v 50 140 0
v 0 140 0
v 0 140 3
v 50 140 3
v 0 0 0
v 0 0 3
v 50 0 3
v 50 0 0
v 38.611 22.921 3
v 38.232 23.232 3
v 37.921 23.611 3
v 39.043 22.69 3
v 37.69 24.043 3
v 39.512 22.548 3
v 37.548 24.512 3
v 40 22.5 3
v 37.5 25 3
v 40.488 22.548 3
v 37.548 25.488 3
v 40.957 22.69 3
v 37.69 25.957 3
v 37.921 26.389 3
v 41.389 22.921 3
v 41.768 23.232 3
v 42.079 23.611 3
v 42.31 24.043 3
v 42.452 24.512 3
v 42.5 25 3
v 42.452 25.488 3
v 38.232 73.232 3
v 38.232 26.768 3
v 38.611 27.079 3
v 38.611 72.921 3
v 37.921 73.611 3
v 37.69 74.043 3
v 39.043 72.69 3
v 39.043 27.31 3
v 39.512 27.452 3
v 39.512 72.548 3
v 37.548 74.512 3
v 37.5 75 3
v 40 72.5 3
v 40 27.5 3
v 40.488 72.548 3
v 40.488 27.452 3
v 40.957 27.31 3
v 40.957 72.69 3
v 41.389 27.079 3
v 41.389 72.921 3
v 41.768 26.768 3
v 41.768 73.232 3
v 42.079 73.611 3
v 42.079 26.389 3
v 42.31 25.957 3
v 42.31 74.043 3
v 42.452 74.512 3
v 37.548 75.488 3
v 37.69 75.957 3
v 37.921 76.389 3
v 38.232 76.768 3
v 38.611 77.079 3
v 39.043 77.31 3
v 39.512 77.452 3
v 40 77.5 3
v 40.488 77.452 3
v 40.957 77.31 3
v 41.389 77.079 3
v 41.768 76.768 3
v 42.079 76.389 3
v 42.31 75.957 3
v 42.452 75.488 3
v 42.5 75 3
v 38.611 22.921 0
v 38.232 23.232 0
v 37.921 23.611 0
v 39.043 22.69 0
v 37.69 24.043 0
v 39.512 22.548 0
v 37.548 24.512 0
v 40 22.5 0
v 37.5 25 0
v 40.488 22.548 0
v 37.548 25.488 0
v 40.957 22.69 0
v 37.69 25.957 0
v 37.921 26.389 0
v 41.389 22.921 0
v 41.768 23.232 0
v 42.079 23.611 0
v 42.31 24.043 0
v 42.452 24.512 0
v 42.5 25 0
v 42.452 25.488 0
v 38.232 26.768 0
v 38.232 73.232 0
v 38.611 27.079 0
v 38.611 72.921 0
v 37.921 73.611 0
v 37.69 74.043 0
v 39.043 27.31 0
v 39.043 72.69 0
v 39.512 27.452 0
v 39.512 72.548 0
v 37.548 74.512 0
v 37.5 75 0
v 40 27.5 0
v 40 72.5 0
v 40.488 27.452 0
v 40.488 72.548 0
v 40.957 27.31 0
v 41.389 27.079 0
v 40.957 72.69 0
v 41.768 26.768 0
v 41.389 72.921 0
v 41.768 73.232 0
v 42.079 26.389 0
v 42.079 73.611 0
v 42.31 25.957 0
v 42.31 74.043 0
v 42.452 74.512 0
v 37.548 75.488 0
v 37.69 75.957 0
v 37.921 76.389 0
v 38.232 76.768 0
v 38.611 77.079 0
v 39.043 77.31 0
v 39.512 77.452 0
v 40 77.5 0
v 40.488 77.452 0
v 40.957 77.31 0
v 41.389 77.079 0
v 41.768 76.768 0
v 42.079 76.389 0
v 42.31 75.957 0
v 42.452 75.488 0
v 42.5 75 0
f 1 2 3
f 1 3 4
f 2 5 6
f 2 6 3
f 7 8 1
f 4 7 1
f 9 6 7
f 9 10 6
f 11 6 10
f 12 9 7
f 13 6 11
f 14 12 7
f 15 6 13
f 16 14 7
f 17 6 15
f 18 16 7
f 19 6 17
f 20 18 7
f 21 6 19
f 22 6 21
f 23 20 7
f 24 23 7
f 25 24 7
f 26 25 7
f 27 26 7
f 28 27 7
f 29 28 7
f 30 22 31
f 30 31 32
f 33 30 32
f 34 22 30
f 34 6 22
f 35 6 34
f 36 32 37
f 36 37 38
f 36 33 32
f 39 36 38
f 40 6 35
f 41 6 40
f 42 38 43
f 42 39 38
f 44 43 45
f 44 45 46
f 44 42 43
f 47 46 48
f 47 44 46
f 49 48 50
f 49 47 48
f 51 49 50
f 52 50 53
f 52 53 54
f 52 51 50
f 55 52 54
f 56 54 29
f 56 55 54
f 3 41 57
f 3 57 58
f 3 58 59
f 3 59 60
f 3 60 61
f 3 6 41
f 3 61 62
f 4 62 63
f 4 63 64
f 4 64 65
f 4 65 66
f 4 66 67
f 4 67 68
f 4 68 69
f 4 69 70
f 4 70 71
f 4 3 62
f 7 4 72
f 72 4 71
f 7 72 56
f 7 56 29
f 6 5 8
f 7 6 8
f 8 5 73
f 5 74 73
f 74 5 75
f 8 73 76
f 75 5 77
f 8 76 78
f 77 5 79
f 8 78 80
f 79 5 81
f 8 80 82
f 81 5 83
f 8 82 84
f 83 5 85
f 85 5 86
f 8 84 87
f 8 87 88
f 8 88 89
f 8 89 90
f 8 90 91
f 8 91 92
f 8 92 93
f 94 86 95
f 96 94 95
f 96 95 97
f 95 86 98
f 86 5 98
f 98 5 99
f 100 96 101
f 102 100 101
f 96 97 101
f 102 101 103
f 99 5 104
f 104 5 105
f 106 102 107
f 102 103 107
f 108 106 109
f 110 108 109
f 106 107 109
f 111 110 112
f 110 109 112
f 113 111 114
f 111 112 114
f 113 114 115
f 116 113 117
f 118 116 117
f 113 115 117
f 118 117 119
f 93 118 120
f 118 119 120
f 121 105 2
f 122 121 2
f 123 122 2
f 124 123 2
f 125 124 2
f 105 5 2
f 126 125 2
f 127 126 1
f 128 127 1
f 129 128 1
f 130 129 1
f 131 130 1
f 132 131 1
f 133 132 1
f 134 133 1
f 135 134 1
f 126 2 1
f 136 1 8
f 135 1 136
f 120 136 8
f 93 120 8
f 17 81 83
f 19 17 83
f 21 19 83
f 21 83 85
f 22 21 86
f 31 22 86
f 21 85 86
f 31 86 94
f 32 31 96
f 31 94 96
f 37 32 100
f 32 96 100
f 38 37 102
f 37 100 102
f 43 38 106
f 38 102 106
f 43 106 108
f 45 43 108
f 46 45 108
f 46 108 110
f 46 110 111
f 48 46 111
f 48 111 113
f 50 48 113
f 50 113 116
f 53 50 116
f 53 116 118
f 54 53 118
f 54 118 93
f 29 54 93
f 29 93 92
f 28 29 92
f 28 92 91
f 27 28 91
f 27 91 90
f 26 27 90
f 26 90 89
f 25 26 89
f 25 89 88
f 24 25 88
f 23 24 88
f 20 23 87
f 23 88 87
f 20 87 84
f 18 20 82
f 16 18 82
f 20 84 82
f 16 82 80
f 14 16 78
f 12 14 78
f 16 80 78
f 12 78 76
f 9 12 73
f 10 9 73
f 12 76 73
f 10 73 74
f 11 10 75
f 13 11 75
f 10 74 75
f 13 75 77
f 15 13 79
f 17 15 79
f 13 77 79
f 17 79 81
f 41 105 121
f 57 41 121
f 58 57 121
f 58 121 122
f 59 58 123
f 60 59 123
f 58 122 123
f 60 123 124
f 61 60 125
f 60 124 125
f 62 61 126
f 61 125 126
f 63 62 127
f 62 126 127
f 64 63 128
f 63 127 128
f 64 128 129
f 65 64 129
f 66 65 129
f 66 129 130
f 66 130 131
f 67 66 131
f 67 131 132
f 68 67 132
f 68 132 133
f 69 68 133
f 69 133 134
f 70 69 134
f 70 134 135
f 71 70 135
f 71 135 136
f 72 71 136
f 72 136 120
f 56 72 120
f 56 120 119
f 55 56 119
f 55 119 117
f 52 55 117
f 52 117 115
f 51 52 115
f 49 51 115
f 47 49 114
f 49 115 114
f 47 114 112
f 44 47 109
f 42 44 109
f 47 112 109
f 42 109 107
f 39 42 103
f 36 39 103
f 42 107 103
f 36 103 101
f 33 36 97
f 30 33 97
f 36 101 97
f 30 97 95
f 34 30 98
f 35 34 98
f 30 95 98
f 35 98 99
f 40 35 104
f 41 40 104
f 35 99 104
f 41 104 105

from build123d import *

# Parameters (mm, degrees)
F0_W     = 50
F0_H     = 140
F1_DEPTH = 3
F4_D     = 5


with BuildPart() as f1:
    # F0 (on Top) → F1 (new body)
    with BuildSketch(Plane.XY):
        with Locations((25, 70)):
            Rectangle(F0_W, F0_H)
    extrude(amount=F1_DEPTH)

    # F4 (through all)
    with Locations(Plane.XY.offset(3)):
        with Locations((40, 75), (40, 25)):
            Hole(F4_D / 2)


solid = f1.part
